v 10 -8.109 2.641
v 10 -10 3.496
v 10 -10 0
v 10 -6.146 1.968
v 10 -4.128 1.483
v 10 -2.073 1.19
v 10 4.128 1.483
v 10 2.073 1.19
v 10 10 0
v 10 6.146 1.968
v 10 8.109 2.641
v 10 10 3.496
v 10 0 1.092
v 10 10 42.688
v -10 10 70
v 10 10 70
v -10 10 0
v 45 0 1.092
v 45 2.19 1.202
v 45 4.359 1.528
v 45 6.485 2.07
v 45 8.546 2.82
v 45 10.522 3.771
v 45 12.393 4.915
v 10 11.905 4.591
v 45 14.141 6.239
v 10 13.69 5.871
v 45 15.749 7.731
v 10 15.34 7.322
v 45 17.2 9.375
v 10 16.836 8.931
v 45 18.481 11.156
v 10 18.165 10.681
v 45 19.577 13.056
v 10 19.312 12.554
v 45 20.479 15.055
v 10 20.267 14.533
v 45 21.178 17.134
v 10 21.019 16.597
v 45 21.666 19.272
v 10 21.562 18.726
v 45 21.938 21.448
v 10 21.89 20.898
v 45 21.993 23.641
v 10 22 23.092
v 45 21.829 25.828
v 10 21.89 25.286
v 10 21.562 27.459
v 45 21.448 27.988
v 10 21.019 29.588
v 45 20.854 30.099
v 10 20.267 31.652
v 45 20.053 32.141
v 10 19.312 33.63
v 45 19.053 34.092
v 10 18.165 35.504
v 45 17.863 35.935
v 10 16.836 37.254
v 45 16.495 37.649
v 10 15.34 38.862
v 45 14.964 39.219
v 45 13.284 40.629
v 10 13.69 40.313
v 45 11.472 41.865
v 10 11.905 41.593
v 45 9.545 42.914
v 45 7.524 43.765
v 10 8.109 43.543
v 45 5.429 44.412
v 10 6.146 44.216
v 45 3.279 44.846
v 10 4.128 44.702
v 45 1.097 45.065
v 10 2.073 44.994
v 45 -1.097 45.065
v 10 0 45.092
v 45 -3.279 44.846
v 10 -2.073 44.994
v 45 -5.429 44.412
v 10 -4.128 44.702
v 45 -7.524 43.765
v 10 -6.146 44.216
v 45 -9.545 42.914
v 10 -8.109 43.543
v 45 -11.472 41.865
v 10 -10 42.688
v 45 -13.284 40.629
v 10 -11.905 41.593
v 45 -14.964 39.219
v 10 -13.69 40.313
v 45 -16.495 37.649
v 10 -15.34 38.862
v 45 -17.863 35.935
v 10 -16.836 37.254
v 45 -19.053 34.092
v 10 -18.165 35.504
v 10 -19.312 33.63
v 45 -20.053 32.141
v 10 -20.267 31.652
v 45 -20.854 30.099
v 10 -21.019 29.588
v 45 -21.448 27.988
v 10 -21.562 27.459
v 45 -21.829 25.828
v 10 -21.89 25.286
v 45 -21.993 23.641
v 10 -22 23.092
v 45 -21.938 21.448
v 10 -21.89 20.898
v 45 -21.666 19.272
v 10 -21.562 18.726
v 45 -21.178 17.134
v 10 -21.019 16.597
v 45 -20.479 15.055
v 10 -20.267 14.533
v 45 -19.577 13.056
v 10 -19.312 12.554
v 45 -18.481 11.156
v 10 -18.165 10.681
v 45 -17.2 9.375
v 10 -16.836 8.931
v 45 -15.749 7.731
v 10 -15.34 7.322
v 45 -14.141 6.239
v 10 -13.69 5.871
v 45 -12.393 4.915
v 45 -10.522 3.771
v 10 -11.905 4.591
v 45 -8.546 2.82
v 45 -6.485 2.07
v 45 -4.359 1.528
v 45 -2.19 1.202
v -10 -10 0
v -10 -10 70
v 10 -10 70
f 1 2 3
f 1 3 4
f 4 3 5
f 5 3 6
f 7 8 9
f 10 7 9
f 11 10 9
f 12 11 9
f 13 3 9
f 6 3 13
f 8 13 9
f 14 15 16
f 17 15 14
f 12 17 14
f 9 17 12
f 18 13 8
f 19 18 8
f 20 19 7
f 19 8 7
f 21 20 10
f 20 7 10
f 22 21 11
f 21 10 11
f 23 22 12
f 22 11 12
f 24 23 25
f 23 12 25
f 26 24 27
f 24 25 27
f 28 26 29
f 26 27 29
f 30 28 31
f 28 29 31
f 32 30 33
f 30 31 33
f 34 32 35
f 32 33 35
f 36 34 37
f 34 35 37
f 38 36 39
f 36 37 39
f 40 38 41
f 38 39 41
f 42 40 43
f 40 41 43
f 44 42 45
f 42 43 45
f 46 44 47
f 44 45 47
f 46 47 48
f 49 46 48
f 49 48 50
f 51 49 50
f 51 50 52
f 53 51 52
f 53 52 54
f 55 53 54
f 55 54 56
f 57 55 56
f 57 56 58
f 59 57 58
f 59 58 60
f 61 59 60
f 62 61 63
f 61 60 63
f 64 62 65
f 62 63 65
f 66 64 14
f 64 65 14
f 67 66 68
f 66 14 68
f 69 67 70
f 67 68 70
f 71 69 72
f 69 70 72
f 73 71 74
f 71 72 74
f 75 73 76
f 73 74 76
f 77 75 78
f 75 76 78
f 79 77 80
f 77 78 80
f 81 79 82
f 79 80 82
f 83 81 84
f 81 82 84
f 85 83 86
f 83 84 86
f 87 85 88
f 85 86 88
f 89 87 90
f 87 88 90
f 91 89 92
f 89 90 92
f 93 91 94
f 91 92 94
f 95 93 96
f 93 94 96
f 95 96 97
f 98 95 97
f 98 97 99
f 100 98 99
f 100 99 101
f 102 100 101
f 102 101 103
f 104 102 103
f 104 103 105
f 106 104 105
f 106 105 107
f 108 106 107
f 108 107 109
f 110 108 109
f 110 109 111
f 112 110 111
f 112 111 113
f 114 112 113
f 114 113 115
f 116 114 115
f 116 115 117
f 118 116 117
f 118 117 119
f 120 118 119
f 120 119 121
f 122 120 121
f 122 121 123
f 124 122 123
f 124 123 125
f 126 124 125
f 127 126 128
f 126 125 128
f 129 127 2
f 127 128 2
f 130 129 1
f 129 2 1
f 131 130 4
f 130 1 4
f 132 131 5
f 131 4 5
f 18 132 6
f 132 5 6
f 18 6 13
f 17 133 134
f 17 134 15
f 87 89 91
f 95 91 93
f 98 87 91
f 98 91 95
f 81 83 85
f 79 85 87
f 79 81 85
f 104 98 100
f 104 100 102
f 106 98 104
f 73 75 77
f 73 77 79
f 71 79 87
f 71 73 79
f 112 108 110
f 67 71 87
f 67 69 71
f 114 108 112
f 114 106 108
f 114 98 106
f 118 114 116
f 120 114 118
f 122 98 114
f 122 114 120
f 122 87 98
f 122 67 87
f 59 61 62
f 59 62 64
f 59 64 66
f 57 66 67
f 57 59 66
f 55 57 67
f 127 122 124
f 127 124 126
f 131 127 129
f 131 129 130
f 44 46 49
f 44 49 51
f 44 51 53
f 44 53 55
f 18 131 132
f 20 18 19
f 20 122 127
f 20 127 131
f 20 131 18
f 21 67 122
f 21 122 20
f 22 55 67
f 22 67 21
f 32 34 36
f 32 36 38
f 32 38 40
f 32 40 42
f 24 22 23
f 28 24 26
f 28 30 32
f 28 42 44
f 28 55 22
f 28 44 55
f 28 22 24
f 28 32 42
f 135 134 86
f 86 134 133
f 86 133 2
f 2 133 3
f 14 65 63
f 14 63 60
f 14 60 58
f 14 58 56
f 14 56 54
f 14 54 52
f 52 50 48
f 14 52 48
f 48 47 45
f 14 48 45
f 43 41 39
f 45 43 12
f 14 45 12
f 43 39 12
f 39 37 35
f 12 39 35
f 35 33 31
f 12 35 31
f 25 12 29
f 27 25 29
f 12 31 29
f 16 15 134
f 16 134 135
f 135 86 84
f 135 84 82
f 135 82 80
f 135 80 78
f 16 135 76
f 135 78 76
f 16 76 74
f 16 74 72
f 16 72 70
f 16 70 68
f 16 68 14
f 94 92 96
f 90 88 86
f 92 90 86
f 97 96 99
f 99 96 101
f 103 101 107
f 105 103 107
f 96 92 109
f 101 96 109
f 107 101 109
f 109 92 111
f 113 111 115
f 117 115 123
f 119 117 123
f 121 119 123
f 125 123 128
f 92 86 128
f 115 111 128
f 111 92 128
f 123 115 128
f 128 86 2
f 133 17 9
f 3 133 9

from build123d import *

# Parameters (mm, degrees)
SKIZZE3_W                       = 20
SKIZZE3_H                       = 20
AUFSATZ_LINEAR_AUSTRAGEN2_DEPTH = 70
SKIZZE4_R                       = 22
AUFSATZ_LINEAR_AUSTRAGEN3_DEPTH = 35


with BuildPart() as part:
    # Skizze3 → Aufsatz-Linear austragen2 (new body)
    with BuildSketch(Plane.XY):
        Rectangle(SKIZZE3_W, SKIZZE3_H)
    extrude(amount=AUFSATZ_LINEAR_AUSTRAGEN2_DEPTH)

    # Skizze4 → Aufsatz-Linear austragen3 (add)
    with BuildSketch(Plane(origin=(10, 0, 0), x_dir=(0, 0, -1), z_dir=(1, 0, 0))):
        with Locations((-23.092221055, 0)):
            Circle(SKIZZE4_R)
    extrude(amount=AUFSATZ_LINEAR_AUSTRAGEN3_DEPTH)


solid = part.part
